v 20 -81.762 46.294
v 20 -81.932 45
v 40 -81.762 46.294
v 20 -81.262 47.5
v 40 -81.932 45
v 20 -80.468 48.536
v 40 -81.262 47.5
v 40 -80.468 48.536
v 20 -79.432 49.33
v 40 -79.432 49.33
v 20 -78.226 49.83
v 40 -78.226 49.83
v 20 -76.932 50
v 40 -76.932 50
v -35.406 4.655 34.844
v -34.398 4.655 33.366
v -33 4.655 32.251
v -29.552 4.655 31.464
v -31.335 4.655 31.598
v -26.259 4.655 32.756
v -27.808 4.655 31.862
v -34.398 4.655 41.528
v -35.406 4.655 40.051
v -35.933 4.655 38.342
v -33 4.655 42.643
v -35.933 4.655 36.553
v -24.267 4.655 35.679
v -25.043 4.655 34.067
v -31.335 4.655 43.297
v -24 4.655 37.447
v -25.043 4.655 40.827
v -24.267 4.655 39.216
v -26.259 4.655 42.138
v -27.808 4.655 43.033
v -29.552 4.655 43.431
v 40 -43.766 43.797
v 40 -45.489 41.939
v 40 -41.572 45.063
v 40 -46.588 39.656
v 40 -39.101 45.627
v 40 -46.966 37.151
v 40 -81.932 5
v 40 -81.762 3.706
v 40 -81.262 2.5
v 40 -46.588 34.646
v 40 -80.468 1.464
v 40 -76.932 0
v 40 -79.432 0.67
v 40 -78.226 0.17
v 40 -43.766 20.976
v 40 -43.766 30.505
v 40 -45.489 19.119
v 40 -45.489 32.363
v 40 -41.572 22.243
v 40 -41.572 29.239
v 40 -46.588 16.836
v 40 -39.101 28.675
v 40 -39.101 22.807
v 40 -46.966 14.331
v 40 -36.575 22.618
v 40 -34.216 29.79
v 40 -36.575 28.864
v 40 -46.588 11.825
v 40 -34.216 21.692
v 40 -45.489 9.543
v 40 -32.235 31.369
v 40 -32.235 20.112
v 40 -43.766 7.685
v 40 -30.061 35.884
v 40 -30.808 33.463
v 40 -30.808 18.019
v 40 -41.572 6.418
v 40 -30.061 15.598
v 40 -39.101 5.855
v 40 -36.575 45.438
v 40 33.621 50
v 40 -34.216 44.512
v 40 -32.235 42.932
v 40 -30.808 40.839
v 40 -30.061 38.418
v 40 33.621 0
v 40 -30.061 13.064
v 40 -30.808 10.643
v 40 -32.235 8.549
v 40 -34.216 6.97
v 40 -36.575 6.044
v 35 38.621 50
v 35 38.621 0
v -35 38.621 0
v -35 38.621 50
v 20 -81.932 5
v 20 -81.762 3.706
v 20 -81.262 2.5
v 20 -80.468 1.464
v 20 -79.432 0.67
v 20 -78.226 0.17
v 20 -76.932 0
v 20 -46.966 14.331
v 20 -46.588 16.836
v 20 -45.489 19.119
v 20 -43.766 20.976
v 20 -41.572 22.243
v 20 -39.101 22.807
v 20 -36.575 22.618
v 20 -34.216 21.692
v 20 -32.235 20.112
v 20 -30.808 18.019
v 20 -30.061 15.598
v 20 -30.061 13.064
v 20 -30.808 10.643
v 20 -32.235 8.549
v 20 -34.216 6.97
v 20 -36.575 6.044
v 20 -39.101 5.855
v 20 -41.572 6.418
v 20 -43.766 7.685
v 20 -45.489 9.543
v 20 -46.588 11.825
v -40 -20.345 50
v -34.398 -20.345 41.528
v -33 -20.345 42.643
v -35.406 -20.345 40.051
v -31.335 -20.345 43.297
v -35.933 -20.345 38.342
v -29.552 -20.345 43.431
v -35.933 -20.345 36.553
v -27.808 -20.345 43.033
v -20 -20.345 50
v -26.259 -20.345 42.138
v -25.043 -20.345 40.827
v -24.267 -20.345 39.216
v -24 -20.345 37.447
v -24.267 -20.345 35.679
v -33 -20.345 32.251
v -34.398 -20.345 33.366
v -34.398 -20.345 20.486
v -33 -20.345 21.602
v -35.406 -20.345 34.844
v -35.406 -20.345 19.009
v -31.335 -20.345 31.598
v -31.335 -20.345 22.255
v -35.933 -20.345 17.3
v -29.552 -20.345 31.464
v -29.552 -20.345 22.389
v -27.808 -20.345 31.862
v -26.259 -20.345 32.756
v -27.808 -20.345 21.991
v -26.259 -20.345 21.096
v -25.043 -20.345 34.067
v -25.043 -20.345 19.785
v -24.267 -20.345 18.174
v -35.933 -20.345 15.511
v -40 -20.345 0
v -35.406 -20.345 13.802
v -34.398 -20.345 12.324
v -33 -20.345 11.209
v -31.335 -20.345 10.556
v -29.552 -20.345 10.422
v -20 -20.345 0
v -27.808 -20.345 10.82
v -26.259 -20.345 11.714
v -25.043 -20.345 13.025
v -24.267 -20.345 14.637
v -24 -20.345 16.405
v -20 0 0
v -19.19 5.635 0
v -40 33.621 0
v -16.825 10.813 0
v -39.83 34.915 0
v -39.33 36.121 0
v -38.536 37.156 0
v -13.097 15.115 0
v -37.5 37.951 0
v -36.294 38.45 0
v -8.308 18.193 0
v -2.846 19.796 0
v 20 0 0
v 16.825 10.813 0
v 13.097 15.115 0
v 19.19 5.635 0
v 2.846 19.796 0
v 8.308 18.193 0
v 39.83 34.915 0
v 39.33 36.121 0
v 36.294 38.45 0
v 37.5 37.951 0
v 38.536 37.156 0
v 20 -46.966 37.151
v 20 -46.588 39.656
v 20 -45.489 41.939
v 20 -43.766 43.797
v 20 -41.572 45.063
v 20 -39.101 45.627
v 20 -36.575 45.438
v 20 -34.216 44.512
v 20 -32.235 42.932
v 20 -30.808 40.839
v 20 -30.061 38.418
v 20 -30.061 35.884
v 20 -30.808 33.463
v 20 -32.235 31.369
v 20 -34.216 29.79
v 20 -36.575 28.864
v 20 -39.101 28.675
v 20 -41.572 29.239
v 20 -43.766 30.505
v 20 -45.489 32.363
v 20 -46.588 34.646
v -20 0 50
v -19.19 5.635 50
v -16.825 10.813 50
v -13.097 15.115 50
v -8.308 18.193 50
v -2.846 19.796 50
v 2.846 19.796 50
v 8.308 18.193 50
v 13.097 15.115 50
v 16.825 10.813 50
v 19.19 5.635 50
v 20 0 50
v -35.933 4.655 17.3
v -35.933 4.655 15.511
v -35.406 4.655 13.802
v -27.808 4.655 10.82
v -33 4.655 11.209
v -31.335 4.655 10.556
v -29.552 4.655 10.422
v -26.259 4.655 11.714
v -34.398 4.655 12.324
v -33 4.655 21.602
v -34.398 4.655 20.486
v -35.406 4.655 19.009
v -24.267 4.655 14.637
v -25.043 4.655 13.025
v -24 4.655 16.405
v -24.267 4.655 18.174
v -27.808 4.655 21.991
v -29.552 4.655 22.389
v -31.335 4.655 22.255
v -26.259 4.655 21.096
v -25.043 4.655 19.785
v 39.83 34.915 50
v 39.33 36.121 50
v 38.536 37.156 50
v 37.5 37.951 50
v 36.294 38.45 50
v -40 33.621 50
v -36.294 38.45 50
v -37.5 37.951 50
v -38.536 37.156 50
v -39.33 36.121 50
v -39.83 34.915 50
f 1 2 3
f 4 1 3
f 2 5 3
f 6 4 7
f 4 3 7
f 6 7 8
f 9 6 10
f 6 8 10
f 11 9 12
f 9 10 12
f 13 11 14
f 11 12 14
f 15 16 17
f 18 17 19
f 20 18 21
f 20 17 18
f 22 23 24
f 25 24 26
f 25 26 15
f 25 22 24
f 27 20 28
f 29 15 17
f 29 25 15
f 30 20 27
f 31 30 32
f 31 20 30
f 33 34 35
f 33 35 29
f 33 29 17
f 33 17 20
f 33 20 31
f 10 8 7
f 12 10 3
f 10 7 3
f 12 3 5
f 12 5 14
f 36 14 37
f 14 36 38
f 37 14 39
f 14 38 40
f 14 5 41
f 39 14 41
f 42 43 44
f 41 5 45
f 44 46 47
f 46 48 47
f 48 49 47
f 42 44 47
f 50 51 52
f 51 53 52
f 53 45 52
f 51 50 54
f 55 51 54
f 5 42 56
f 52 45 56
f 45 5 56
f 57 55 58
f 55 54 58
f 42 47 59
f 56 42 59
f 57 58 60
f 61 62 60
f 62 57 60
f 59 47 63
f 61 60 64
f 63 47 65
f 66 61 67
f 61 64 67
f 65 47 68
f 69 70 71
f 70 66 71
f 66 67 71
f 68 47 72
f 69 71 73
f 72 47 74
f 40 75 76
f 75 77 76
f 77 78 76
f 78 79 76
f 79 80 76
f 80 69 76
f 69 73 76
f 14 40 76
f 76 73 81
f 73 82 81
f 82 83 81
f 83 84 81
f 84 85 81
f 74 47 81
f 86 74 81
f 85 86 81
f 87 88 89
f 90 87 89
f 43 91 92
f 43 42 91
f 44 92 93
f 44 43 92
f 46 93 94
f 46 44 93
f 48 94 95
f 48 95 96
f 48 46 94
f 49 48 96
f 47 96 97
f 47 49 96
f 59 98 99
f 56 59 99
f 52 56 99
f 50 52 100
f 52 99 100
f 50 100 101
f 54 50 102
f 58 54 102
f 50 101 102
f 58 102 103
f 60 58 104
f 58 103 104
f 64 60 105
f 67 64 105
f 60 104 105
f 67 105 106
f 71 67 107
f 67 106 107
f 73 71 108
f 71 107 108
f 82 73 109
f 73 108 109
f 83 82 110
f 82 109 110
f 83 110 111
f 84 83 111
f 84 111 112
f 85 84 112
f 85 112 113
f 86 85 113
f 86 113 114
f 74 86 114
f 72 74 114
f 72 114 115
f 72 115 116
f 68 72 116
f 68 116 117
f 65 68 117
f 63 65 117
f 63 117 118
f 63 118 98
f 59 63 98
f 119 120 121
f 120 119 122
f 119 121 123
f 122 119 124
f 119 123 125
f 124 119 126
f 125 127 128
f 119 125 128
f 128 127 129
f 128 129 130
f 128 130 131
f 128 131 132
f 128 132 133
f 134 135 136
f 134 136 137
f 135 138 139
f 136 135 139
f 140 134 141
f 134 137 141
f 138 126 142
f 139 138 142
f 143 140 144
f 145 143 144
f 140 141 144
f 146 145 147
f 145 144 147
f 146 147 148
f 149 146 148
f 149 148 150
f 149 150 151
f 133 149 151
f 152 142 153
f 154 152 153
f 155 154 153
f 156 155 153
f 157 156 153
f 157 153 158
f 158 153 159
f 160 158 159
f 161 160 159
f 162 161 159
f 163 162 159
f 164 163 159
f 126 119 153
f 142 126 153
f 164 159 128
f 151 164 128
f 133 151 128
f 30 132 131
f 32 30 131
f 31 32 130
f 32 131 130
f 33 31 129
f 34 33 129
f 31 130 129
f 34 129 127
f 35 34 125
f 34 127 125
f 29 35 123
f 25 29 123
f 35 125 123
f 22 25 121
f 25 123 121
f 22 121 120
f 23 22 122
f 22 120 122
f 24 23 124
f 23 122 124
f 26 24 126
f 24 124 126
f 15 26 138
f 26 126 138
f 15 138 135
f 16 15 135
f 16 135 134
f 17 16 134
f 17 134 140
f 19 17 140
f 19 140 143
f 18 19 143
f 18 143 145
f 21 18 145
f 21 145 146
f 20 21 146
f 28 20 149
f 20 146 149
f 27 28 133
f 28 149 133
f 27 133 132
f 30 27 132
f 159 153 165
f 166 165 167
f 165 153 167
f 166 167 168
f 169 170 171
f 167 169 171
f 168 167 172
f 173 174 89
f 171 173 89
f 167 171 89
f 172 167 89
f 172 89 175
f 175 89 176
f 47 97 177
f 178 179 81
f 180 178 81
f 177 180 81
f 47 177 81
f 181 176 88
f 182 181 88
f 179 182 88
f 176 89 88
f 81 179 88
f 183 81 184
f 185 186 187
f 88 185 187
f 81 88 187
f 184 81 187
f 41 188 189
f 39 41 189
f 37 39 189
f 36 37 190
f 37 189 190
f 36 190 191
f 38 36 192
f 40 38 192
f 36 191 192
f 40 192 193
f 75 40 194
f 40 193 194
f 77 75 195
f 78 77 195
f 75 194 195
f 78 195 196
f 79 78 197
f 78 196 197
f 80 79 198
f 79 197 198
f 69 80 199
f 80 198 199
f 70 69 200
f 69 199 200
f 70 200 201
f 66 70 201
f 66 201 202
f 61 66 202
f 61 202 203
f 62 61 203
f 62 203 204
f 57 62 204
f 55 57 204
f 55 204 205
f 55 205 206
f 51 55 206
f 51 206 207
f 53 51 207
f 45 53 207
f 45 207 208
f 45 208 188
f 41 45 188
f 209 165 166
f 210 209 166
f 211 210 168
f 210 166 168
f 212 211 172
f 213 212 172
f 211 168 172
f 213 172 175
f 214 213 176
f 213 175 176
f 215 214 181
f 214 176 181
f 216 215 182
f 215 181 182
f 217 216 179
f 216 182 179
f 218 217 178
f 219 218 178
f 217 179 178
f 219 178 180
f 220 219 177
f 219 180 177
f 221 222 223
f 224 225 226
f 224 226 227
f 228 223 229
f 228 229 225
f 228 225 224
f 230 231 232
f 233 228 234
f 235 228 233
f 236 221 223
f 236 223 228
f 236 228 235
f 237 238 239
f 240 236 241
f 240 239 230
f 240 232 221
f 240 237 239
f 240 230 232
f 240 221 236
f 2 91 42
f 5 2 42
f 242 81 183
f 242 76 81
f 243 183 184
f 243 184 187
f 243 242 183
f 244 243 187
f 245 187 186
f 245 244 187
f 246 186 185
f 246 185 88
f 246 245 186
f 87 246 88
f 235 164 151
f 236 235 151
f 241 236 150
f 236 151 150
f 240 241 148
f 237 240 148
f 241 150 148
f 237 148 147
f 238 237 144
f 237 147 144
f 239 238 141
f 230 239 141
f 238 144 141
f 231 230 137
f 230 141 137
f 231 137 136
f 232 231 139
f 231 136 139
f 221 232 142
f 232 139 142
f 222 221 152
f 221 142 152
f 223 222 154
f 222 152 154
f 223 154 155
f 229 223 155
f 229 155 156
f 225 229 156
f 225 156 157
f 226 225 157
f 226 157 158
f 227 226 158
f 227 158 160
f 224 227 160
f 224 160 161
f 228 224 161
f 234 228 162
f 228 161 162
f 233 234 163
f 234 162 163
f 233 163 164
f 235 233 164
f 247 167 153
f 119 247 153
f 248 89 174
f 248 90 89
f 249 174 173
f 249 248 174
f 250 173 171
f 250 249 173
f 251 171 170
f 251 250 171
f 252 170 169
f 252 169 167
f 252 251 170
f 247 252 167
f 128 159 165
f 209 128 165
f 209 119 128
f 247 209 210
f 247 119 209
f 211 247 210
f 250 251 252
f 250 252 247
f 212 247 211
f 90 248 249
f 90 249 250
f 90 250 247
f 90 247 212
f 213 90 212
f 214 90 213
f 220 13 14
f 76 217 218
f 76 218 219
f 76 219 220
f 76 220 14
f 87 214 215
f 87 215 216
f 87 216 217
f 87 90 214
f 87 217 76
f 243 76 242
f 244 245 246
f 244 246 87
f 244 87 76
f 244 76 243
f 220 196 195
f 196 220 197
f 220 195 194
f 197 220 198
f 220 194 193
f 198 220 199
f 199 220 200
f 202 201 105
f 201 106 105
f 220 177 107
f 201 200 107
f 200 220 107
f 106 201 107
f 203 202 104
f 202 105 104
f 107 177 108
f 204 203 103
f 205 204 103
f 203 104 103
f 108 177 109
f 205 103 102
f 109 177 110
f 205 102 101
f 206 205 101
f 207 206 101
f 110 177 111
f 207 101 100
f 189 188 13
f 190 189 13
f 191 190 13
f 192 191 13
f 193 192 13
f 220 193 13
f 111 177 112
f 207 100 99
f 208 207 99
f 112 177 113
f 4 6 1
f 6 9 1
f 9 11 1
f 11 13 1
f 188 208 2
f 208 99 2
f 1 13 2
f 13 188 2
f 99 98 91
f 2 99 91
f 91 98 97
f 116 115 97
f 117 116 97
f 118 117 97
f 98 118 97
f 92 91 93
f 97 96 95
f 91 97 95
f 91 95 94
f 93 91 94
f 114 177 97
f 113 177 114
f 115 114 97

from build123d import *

# Parameters (mm, degrees)
F1_DEPTH = 50
F2_R     = 5
F3_R     = 8.5
F4_DEPTH = 20.001
F5_R     = 6
F6_DEPTH = 25


with BuildPart() as f1:
    # F0 (on Top) → F1 (new body)
    with BuildSketch(Plane.XY):
        with BuildLine():
            ThreePointArc((-20, 0), (0, 20), (20, 0))
            Line((20, 0), (20, -81.932239))
            Line((20, -81.932239), (40, -81.932239))
            Line((40, -81.932239), (40, 38.620689))
            Line((40, 38.620689), (-40, 38.620689))
            Line((-40, 38.620689), (-40, -20.34483))
            Line((-40, -20.34483), (-20, -20.34483))
            Line((-20, -20.34483), (-20, 0))
        make_face()
    extrude(amount=F1_DEPTH)

    # F2
    f2_edges = [f1.edges().sort_by_distance(p)[0] for p in [
        (-40, 38.620689, 25),
        (40, 38.620689, 25),
        (30, -81.932239, 50),
        (30, -81.932239, 0),
    ]]
    fillet(f2_edges, radius=F2_R)

    # F3 (on face) → F4 (cut, through all)
    with BuildSketch(Plane(origin=(20, 0, 0), x_dir=(0, -1, 0), z_dir=(-1, 0, 0))):
        with Locations((38.466119, 37.150957)):
            Circle(F3_R)
        with Locations((38.466119, 14.330863)):
            Circle(F3_R)
    extrude(amount=-F4_DEPTH, mode=Mode.SUBTRACT)

    # F5 (on face) → F6 (cut)
    with BuildSketch(Plane.XZ.offset(20.34483)):
        with Locations((-30, 37.447322)):
            Circle(F5_R)
        with Locations((-30, 16.405419)):
            Circle(F5_R)
    extrude(amount=-F6_DEPTH, mode=Mode.SUBTRACT)


solid = f1.part
